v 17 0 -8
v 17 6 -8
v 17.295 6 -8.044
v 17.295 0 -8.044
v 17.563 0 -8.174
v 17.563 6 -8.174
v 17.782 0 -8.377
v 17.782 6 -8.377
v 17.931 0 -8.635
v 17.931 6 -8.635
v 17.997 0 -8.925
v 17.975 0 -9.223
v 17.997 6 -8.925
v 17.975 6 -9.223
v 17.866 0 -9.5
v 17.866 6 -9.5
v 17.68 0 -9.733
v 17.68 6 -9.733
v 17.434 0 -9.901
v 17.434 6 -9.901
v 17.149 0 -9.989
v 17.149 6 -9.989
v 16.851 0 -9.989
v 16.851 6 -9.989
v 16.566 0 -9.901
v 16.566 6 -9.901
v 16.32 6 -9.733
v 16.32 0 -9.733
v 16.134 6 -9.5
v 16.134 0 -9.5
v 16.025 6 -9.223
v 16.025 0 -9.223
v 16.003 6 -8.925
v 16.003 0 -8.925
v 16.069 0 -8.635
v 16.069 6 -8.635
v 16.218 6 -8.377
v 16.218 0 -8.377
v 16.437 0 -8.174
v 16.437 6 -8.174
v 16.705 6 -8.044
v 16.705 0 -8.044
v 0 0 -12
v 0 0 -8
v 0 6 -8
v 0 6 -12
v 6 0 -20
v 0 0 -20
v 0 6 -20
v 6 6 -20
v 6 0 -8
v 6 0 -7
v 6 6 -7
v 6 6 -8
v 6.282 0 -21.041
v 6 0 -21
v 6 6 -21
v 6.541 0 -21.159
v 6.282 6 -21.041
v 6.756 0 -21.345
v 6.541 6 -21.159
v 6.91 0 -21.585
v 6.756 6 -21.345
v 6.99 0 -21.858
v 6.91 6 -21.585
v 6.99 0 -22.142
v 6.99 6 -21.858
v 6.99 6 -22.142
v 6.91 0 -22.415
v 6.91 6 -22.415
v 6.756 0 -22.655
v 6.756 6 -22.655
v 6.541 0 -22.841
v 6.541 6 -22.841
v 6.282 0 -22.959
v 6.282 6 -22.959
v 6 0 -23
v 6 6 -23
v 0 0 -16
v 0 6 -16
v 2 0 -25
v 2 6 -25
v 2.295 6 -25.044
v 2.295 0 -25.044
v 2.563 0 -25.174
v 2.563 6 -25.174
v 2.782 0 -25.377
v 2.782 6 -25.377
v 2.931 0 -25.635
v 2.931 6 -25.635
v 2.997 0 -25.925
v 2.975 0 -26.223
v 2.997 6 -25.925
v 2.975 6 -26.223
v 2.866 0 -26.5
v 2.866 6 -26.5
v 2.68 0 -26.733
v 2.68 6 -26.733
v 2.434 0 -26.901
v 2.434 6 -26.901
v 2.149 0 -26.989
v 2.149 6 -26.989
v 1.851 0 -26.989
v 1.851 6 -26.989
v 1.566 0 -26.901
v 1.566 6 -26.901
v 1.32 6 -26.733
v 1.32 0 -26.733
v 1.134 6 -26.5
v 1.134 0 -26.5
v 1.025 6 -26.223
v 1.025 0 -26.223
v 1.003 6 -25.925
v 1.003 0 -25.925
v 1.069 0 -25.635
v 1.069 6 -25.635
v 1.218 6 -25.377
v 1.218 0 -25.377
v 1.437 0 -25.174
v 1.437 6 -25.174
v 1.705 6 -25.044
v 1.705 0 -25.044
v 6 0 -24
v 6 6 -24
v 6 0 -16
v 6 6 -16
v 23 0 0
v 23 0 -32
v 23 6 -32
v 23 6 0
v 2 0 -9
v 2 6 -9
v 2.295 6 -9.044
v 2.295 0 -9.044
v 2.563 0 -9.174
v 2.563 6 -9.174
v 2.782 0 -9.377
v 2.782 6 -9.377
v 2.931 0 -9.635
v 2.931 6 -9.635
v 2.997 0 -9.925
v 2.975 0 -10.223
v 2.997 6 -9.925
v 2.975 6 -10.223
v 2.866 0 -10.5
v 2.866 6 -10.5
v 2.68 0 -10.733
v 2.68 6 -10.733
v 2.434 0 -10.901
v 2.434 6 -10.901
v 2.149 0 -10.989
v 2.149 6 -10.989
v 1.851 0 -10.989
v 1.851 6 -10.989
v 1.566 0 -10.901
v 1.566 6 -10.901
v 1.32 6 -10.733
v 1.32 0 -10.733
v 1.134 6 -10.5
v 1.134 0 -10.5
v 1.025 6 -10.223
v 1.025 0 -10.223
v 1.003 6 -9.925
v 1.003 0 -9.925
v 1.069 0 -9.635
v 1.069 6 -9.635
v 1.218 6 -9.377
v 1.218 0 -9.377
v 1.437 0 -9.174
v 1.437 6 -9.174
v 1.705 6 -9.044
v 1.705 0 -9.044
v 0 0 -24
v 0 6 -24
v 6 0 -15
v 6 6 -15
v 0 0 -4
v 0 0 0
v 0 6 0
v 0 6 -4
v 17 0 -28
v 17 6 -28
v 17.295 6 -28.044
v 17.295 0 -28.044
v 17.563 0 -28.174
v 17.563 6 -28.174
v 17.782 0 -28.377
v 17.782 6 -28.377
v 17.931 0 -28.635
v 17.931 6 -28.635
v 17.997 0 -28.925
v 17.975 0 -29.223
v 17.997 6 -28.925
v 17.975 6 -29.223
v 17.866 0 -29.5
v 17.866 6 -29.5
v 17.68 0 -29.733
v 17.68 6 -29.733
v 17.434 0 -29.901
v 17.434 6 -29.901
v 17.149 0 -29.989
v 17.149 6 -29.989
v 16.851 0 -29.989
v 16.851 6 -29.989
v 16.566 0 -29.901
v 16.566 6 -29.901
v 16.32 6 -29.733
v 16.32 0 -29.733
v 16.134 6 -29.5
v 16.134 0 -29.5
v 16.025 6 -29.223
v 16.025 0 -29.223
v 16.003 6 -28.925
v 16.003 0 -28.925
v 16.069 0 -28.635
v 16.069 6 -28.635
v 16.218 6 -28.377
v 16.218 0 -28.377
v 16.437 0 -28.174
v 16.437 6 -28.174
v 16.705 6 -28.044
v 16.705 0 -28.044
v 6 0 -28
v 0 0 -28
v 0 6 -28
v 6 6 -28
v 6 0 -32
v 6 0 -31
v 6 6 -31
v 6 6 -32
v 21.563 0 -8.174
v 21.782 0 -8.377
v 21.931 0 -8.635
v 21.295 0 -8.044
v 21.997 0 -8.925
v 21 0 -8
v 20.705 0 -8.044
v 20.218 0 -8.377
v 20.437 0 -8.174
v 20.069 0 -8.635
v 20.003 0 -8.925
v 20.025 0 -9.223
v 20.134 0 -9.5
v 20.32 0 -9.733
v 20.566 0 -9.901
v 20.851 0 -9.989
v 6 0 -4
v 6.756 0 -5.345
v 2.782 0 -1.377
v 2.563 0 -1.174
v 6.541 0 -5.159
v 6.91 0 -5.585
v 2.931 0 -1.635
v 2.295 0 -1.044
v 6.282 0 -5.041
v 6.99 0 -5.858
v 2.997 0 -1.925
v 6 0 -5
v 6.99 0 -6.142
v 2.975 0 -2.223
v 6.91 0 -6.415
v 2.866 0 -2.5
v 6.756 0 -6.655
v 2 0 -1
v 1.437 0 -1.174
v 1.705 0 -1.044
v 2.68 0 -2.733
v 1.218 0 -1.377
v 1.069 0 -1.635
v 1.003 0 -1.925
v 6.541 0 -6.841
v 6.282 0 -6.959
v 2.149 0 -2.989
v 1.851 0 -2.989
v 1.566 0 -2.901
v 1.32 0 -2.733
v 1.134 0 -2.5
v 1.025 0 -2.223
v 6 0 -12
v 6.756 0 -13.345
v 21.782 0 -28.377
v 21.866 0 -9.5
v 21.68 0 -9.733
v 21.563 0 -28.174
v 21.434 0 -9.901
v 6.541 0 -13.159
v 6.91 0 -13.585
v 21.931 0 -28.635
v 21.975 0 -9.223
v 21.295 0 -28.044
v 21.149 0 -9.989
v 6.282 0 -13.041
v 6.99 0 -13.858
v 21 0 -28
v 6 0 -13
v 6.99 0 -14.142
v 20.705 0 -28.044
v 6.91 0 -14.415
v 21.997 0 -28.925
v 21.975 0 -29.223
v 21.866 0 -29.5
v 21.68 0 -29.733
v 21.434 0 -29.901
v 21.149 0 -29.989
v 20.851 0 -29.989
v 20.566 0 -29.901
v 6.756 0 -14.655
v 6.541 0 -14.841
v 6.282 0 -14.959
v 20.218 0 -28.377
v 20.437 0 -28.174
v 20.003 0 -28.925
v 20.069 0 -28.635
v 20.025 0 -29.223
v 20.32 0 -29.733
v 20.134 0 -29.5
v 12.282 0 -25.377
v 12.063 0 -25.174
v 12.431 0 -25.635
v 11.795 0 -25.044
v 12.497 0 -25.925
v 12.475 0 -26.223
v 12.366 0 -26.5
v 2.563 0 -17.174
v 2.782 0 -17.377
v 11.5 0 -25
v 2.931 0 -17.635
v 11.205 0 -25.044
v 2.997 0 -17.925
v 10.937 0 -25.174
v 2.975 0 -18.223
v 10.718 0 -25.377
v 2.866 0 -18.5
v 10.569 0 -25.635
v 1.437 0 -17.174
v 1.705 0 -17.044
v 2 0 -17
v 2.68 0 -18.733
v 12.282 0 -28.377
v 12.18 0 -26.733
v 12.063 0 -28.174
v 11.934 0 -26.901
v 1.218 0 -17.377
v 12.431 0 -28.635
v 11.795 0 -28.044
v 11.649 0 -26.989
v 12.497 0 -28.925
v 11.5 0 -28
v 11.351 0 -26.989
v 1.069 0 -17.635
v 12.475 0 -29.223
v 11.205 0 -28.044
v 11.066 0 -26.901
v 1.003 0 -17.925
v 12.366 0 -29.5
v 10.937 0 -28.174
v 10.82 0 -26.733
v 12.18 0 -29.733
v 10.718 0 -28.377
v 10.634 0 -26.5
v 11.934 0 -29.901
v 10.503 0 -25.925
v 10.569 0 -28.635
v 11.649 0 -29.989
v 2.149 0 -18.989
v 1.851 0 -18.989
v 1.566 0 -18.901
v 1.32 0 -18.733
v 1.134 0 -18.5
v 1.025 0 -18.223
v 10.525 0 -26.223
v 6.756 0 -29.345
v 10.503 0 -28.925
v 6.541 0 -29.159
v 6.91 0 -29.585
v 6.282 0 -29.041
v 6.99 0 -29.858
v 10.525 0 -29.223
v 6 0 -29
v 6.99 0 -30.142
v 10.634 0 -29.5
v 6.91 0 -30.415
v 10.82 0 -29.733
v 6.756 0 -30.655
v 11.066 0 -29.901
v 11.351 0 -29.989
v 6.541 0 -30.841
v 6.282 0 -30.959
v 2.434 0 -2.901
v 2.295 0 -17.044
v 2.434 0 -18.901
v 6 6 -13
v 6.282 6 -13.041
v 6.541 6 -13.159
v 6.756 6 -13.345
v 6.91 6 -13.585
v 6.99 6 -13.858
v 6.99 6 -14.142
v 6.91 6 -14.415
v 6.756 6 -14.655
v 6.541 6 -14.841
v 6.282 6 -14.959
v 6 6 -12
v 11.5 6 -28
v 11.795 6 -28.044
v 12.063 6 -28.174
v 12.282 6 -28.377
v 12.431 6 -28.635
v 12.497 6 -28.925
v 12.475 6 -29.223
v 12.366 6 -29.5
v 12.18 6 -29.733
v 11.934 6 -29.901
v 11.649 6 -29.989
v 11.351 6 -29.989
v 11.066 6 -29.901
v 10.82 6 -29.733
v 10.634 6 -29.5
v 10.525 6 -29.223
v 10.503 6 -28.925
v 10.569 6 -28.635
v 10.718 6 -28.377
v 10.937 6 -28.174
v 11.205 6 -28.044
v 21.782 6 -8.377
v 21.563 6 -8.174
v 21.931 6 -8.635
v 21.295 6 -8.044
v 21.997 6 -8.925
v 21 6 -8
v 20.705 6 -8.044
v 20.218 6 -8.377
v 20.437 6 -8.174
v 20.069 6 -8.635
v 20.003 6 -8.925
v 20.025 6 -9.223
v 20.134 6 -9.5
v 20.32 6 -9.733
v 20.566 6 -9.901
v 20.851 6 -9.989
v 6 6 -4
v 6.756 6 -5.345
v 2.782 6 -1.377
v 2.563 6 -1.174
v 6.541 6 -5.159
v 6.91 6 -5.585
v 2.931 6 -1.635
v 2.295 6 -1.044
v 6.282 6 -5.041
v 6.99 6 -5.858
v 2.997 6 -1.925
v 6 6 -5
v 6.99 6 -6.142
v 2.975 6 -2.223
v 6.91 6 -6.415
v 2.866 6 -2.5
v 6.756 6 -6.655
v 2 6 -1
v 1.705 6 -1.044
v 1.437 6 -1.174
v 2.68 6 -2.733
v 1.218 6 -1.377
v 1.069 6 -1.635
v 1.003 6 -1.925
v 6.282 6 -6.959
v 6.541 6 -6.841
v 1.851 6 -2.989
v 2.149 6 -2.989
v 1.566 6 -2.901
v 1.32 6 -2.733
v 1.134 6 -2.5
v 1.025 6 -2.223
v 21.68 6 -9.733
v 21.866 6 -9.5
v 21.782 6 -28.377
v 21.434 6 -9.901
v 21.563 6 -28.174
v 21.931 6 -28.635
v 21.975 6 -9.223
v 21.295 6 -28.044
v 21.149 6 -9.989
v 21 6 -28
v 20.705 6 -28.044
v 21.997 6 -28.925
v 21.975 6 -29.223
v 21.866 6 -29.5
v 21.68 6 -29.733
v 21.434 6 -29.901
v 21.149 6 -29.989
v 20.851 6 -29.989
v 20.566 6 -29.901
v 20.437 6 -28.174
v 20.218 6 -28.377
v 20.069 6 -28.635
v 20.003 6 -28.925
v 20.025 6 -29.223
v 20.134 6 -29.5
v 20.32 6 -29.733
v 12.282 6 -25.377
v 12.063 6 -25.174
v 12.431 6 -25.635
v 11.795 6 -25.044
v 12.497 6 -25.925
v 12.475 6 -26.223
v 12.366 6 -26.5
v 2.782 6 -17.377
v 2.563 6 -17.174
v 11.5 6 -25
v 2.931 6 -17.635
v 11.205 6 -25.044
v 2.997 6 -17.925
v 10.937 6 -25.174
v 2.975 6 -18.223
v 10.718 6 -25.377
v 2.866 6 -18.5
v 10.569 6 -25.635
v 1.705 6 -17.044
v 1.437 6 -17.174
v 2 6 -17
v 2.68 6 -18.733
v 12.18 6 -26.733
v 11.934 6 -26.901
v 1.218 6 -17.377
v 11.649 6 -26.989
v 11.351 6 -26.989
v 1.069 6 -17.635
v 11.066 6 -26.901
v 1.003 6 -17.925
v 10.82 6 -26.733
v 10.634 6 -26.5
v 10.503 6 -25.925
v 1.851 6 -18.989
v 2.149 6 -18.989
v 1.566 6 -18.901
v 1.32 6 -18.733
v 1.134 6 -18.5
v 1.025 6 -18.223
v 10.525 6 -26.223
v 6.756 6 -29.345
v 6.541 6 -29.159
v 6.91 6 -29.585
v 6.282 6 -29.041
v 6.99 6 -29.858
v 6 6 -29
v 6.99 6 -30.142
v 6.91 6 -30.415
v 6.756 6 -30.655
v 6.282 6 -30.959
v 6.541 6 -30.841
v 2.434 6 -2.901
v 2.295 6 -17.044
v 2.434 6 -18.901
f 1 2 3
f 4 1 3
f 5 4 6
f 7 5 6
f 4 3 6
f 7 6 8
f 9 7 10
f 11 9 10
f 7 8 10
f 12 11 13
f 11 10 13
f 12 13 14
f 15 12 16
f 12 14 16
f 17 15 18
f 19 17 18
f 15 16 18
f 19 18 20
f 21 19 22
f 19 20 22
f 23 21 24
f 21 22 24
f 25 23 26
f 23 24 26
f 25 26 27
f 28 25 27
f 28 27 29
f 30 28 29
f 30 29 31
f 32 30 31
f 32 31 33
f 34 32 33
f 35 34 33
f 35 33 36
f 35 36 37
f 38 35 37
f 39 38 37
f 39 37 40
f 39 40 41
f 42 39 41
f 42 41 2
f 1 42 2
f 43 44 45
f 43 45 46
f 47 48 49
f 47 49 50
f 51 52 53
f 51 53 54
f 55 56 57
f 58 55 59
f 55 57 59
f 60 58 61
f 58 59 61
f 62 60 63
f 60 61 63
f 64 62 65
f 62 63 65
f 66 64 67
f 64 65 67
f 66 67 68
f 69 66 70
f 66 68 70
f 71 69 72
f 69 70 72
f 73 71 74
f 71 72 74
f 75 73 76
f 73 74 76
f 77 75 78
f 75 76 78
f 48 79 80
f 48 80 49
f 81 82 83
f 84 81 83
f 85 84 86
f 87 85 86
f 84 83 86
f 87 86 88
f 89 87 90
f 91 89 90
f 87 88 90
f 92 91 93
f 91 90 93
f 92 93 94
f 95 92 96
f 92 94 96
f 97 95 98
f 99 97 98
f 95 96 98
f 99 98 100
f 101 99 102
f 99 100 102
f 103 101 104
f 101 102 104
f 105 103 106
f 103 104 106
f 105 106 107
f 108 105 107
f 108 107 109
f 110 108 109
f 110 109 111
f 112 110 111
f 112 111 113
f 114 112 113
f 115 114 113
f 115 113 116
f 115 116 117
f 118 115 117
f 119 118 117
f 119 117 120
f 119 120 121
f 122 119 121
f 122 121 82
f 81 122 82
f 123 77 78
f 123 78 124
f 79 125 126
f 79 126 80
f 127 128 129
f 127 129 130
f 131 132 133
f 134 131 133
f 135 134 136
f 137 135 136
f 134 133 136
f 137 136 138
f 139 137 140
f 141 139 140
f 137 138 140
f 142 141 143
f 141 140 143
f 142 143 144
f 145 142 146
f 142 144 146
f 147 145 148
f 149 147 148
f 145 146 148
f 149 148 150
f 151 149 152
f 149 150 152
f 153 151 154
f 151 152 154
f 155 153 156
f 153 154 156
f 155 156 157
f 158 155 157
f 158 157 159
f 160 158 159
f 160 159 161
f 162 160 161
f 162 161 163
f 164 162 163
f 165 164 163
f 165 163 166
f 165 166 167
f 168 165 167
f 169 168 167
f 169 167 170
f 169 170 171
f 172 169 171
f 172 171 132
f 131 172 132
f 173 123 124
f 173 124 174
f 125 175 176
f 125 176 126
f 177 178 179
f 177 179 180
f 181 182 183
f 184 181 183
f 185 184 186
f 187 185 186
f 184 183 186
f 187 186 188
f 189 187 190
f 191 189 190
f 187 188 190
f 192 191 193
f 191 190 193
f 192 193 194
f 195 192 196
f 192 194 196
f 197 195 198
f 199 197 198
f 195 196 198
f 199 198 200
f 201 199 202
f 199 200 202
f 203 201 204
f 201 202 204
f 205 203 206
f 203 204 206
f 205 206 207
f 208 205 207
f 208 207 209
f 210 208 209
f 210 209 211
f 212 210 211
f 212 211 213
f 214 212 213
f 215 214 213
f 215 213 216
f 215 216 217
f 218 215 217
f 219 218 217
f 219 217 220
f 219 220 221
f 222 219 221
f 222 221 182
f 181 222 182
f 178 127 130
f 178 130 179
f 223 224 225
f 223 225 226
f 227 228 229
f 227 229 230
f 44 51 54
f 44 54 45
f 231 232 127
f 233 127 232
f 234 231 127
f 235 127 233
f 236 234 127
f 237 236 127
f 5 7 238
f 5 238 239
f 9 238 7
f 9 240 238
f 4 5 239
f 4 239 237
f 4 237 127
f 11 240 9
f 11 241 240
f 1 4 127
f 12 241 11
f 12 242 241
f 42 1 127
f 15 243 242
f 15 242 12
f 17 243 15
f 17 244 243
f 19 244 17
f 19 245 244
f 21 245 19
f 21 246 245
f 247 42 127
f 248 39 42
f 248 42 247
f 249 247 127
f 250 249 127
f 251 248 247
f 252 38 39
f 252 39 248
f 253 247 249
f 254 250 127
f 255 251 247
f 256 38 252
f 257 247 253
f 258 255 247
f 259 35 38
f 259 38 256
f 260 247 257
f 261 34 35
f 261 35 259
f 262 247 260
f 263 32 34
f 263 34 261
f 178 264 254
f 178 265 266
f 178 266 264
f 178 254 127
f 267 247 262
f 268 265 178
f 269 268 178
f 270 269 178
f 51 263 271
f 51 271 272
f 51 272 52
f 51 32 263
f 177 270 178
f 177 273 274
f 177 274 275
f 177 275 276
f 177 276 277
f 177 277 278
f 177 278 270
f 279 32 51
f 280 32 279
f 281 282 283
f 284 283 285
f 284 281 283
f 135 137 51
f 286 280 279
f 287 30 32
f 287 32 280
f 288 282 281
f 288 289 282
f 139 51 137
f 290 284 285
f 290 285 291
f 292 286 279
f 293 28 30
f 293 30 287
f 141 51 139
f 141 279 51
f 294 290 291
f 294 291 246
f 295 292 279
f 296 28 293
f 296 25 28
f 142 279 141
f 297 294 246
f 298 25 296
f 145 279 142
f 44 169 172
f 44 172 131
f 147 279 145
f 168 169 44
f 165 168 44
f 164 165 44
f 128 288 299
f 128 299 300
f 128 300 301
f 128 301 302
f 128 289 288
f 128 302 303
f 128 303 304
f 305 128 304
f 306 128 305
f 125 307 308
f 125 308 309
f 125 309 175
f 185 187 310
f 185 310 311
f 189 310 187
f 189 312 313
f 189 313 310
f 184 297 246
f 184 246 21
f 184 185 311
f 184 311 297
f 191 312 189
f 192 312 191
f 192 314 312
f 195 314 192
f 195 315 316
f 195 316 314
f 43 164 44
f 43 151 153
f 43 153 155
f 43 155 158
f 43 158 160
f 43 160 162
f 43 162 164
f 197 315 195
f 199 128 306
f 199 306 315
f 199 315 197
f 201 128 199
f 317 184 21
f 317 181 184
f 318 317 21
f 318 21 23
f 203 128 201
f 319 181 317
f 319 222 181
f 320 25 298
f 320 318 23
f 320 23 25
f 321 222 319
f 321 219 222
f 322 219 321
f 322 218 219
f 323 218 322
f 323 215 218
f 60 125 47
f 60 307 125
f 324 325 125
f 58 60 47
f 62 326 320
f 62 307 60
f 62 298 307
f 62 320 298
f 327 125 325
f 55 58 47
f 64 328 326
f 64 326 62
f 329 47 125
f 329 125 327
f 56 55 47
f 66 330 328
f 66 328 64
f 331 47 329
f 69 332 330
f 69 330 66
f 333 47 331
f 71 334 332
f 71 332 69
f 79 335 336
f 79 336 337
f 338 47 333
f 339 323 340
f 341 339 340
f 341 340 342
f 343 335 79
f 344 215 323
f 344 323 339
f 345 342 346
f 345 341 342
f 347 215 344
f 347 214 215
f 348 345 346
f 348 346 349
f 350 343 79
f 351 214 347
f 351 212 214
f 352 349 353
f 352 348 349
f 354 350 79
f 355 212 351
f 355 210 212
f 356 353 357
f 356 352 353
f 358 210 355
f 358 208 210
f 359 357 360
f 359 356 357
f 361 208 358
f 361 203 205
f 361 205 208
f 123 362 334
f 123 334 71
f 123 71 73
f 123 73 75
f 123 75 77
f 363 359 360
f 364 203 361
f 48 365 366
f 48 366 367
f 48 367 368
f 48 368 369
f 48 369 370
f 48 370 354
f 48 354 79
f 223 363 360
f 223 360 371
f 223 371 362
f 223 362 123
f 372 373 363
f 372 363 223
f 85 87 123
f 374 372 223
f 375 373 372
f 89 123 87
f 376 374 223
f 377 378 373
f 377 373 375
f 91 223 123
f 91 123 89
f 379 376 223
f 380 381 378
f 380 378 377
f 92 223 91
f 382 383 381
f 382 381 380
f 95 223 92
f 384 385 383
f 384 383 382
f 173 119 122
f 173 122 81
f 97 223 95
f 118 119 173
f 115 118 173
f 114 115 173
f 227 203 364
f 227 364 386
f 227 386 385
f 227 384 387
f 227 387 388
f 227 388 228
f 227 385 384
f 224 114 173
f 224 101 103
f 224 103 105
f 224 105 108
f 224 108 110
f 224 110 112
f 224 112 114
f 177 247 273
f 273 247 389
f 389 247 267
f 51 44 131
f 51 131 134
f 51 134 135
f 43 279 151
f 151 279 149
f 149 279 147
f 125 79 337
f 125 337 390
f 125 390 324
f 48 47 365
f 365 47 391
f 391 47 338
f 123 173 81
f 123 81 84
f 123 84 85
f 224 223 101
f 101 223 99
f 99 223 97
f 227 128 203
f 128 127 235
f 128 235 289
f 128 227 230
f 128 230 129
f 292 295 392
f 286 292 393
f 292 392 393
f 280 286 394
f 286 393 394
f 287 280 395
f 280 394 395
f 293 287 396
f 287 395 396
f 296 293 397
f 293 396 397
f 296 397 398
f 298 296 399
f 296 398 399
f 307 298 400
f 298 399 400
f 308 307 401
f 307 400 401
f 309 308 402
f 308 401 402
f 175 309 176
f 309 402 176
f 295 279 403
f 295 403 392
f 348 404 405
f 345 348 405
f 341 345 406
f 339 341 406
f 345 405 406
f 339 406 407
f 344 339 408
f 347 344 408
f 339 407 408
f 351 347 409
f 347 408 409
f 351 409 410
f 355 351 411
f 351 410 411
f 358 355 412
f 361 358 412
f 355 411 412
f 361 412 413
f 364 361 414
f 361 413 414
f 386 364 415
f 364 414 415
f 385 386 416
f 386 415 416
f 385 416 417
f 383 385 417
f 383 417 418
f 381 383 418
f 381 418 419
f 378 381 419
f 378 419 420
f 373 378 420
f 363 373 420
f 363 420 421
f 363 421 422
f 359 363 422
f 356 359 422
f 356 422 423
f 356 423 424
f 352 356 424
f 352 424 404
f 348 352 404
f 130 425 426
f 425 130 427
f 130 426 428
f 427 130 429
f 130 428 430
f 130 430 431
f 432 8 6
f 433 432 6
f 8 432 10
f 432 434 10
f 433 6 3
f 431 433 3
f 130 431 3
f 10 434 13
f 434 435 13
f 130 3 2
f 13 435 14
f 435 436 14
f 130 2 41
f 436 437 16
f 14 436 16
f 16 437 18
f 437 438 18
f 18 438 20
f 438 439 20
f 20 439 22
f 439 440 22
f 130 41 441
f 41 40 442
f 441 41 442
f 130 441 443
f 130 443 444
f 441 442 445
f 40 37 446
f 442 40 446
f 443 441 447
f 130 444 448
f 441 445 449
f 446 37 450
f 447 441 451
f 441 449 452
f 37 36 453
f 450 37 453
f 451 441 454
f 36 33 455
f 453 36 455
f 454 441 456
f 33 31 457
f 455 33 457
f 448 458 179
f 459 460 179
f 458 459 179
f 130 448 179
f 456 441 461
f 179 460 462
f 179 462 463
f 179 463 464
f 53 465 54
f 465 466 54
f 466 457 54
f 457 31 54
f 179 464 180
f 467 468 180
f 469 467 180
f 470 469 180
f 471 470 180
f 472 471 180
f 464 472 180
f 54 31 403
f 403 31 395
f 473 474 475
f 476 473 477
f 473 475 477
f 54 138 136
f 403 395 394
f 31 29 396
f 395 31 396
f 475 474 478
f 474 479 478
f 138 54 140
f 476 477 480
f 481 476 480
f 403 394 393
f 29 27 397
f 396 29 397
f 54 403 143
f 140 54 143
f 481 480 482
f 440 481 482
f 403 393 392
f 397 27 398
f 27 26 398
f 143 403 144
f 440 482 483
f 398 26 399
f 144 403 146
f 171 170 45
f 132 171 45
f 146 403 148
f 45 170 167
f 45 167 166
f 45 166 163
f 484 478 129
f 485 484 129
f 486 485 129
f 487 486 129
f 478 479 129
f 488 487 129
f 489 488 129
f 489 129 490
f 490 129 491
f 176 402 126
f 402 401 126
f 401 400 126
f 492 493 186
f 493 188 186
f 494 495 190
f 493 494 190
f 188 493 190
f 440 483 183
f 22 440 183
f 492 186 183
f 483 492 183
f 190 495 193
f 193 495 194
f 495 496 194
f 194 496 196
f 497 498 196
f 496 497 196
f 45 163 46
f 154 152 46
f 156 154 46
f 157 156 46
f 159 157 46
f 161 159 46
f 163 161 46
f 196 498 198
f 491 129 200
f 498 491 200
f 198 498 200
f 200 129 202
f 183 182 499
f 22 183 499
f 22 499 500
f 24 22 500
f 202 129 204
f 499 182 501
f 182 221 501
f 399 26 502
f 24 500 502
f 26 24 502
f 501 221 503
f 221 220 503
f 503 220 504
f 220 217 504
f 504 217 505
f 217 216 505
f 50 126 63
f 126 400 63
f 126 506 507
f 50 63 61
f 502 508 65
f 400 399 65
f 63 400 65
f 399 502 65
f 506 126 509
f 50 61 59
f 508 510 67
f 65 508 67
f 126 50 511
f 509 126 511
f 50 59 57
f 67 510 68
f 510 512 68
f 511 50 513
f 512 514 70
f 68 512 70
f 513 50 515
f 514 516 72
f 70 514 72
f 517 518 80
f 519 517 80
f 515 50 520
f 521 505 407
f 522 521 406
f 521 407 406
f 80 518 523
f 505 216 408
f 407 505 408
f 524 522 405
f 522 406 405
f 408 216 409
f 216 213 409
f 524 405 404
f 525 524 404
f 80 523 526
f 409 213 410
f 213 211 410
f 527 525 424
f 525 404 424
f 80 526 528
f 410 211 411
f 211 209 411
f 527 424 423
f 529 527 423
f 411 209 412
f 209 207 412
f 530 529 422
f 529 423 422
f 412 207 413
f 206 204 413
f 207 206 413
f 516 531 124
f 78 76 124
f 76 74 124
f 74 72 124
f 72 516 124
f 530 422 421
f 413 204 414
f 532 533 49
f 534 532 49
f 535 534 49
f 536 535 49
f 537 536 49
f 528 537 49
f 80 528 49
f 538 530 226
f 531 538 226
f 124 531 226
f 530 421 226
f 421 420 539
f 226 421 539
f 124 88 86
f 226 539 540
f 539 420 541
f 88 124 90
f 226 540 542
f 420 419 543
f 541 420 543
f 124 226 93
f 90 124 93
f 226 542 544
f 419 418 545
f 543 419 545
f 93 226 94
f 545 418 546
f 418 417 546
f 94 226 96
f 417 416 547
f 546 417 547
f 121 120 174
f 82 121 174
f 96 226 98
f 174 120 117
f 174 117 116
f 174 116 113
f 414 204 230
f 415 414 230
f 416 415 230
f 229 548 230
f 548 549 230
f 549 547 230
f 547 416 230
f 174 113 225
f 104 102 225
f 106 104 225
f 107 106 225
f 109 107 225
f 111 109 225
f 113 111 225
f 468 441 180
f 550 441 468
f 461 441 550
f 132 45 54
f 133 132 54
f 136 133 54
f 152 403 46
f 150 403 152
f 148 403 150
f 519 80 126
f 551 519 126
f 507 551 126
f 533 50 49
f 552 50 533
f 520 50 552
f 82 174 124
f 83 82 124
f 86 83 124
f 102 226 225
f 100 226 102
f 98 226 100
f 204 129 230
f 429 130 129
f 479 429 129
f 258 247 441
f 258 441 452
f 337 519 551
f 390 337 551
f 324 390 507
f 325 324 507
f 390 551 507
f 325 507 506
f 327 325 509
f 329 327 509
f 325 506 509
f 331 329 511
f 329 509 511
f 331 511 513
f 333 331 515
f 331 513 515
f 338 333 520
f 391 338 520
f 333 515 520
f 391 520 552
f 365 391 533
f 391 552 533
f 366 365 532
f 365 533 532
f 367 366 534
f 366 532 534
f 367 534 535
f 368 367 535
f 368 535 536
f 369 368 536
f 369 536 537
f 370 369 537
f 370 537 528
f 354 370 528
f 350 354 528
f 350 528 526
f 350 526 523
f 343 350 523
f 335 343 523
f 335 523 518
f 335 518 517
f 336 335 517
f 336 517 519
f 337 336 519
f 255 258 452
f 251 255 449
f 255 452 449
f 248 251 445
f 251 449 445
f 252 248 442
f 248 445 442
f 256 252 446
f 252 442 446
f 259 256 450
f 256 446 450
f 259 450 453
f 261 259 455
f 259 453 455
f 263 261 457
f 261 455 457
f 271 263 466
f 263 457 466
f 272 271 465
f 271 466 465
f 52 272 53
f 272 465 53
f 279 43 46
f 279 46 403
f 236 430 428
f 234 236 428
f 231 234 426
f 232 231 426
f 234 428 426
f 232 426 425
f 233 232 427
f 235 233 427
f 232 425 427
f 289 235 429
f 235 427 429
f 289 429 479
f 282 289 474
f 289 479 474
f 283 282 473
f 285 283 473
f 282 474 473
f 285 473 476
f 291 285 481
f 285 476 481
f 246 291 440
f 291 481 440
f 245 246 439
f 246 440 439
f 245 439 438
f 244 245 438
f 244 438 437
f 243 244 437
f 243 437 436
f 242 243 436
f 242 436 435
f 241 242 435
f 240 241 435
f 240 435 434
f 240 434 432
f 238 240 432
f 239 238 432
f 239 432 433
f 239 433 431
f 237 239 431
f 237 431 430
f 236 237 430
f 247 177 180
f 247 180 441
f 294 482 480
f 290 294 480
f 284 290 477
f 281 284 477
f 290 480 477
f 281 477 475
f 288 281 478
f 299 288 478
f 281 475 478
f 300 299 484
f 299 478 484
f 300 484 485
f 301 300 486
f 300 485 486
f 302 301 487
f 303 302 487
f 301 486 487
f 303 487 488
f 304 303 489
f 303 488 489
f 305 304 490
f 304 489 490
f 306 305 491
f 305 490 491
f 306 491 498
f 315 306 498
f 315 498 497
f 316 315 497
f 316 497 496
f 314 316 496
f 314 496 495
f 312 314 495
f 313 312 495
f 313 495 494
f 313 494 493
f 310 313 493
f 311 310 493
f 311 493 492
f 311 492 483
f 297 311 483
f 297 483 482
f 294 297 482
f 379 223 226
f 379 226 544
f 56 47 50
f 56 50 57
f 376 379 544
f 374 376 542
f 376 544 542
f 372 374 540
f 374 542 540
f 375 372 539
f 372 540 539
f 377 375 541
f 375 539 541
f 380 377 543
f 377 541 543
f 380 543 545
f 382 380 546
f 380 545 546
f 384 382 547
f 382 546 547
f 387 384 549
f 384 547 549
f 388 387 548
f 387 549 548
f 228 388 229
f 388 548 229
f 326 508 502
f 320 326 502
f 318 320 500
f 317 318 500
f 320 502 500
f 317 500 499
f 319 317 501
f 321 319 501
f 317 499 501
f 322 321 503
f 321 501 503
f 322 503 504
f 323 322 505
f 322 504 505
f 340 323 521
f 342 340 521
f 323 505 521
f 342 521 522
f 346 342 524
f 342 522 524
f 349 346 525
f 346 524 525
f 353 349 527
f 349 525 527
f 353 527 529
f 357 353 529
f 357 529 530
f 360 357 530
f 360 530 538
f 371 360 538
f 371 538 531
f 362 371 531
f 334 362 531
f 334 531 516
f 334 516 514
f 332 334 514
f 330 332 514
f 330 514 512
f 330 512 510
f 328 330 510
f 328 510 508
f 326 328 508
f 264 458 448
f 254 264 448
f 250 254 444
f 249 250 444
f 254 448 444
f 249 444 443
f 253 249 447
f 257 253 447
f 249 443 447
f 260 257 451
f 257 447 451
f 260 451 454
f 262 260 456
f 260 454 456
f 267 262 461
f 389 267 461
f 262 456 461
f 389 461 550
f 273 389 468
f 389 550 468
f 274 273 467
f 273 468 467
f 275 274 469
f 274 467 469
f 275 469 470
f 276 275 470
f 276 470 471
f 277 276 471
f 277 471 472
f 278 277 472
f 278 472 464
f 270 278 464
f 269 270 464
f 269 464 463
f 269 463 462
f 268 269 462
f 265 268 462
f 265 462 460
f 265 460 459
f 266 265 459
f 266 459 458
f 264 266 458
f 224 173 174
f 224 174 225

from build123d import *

# Parameters (mm, degrees)
BOSS_EXTRUDE1_DEPTH = 6
SKETCH2_R           = 1
CUT_EXTRUDE1_DEPTH  = 40.862262856
SKETCH3_R           = 1
CUT_EXTRUDE2_DEPTH  = 40.862262856


with BuildPart() as part:
    # Sketch1 → Boss-Extrude1 (new body)
    with BuildSketch(Plane(origin=(0, 0, 0), x_dir=(1, 0, 0), z_dir=(0, 1, 0))):
        Polygon((0, 0), (0, 4), (6, 4), (6, 8), (0, 8), (0, 12), (6, 12), (6, 16), (0, 16), (0, 20), (6, 20), (6, 24), (0, 24), (0, 28), (6, 28), (6, 32), (23, 32), (23, 0), align=None)
    extrude(amount=BOSS_EXTRUDE1_DEPTH)

    # Sketch2 → Cut-Extrude1 (cut, through all)
    with BuildSketch(Plane(origin=(0, 6, 0), x_dir=(1, 0, 0), z_dir=(0, 1, 0))):
        with Locations(Location((2, 26, 0), (0, 0, 270))):
            Circle(SKETCH2_R)
        with Locations(Location((2, 18, 0), (0, 0, 270))):
            Circle(SKETCH2_R)
        with Locations(Location((2, 10, 0), (0, 0, 270))):
            Circle(SKETCH2_R)
        with Locations(Location((2, 2, 0), (0, 0, 270))):
            Circle(SKETCH2_R)
        with Locations((6, 22)):
            Circle(SKETCH2_R)
        with Locations((6, 30)):
            Circle(SKETCH2_R)
        with Locations((6, 14)):
            Circle(SKETCH2_R)
        with Locations((6, 6)):
            Circle(SKETCH2_R)
        with Locations(Location((21, 29, 0), (0, 0, 270))):
            Circle(SKETCH2_R)
        with Locations(Location((21, 9, 0), (0, 0, 270))):
            Circle(SKETCH2_R)
        with Locations(Location((17, 29, 0), (0, 0, 270))):
            Circle(SKETCH2_R)
        with Locations(Location((17, 9, 0), (0, 0, 270))):
            Circle(SKETCH2_R)
    extrude(amount=-CUT_EXTRUDE1_DEPTH, mode=Mode.SUBTRACT)

    # Sketch3 → Cut-Extrude2 (cut, through all)
    with BuildSketch(Plane(origin=(0, 6, 0), x_dir=(1, 0, 0), z_dir=(0, 1, 0))):
        with Locations(Location((11.5, 29, 0), (0, 0, 270))):
            Circle(SKETCH3_R)
        with Locations(Location((11.5, 26, 0), (0, 0, 270))):
            Circle(SKETCH3_R)
    extrude(amount=-CUT_EXTRUDE2_DEPTH, mode=Mode.SUBTRACT)


solid = part.part
